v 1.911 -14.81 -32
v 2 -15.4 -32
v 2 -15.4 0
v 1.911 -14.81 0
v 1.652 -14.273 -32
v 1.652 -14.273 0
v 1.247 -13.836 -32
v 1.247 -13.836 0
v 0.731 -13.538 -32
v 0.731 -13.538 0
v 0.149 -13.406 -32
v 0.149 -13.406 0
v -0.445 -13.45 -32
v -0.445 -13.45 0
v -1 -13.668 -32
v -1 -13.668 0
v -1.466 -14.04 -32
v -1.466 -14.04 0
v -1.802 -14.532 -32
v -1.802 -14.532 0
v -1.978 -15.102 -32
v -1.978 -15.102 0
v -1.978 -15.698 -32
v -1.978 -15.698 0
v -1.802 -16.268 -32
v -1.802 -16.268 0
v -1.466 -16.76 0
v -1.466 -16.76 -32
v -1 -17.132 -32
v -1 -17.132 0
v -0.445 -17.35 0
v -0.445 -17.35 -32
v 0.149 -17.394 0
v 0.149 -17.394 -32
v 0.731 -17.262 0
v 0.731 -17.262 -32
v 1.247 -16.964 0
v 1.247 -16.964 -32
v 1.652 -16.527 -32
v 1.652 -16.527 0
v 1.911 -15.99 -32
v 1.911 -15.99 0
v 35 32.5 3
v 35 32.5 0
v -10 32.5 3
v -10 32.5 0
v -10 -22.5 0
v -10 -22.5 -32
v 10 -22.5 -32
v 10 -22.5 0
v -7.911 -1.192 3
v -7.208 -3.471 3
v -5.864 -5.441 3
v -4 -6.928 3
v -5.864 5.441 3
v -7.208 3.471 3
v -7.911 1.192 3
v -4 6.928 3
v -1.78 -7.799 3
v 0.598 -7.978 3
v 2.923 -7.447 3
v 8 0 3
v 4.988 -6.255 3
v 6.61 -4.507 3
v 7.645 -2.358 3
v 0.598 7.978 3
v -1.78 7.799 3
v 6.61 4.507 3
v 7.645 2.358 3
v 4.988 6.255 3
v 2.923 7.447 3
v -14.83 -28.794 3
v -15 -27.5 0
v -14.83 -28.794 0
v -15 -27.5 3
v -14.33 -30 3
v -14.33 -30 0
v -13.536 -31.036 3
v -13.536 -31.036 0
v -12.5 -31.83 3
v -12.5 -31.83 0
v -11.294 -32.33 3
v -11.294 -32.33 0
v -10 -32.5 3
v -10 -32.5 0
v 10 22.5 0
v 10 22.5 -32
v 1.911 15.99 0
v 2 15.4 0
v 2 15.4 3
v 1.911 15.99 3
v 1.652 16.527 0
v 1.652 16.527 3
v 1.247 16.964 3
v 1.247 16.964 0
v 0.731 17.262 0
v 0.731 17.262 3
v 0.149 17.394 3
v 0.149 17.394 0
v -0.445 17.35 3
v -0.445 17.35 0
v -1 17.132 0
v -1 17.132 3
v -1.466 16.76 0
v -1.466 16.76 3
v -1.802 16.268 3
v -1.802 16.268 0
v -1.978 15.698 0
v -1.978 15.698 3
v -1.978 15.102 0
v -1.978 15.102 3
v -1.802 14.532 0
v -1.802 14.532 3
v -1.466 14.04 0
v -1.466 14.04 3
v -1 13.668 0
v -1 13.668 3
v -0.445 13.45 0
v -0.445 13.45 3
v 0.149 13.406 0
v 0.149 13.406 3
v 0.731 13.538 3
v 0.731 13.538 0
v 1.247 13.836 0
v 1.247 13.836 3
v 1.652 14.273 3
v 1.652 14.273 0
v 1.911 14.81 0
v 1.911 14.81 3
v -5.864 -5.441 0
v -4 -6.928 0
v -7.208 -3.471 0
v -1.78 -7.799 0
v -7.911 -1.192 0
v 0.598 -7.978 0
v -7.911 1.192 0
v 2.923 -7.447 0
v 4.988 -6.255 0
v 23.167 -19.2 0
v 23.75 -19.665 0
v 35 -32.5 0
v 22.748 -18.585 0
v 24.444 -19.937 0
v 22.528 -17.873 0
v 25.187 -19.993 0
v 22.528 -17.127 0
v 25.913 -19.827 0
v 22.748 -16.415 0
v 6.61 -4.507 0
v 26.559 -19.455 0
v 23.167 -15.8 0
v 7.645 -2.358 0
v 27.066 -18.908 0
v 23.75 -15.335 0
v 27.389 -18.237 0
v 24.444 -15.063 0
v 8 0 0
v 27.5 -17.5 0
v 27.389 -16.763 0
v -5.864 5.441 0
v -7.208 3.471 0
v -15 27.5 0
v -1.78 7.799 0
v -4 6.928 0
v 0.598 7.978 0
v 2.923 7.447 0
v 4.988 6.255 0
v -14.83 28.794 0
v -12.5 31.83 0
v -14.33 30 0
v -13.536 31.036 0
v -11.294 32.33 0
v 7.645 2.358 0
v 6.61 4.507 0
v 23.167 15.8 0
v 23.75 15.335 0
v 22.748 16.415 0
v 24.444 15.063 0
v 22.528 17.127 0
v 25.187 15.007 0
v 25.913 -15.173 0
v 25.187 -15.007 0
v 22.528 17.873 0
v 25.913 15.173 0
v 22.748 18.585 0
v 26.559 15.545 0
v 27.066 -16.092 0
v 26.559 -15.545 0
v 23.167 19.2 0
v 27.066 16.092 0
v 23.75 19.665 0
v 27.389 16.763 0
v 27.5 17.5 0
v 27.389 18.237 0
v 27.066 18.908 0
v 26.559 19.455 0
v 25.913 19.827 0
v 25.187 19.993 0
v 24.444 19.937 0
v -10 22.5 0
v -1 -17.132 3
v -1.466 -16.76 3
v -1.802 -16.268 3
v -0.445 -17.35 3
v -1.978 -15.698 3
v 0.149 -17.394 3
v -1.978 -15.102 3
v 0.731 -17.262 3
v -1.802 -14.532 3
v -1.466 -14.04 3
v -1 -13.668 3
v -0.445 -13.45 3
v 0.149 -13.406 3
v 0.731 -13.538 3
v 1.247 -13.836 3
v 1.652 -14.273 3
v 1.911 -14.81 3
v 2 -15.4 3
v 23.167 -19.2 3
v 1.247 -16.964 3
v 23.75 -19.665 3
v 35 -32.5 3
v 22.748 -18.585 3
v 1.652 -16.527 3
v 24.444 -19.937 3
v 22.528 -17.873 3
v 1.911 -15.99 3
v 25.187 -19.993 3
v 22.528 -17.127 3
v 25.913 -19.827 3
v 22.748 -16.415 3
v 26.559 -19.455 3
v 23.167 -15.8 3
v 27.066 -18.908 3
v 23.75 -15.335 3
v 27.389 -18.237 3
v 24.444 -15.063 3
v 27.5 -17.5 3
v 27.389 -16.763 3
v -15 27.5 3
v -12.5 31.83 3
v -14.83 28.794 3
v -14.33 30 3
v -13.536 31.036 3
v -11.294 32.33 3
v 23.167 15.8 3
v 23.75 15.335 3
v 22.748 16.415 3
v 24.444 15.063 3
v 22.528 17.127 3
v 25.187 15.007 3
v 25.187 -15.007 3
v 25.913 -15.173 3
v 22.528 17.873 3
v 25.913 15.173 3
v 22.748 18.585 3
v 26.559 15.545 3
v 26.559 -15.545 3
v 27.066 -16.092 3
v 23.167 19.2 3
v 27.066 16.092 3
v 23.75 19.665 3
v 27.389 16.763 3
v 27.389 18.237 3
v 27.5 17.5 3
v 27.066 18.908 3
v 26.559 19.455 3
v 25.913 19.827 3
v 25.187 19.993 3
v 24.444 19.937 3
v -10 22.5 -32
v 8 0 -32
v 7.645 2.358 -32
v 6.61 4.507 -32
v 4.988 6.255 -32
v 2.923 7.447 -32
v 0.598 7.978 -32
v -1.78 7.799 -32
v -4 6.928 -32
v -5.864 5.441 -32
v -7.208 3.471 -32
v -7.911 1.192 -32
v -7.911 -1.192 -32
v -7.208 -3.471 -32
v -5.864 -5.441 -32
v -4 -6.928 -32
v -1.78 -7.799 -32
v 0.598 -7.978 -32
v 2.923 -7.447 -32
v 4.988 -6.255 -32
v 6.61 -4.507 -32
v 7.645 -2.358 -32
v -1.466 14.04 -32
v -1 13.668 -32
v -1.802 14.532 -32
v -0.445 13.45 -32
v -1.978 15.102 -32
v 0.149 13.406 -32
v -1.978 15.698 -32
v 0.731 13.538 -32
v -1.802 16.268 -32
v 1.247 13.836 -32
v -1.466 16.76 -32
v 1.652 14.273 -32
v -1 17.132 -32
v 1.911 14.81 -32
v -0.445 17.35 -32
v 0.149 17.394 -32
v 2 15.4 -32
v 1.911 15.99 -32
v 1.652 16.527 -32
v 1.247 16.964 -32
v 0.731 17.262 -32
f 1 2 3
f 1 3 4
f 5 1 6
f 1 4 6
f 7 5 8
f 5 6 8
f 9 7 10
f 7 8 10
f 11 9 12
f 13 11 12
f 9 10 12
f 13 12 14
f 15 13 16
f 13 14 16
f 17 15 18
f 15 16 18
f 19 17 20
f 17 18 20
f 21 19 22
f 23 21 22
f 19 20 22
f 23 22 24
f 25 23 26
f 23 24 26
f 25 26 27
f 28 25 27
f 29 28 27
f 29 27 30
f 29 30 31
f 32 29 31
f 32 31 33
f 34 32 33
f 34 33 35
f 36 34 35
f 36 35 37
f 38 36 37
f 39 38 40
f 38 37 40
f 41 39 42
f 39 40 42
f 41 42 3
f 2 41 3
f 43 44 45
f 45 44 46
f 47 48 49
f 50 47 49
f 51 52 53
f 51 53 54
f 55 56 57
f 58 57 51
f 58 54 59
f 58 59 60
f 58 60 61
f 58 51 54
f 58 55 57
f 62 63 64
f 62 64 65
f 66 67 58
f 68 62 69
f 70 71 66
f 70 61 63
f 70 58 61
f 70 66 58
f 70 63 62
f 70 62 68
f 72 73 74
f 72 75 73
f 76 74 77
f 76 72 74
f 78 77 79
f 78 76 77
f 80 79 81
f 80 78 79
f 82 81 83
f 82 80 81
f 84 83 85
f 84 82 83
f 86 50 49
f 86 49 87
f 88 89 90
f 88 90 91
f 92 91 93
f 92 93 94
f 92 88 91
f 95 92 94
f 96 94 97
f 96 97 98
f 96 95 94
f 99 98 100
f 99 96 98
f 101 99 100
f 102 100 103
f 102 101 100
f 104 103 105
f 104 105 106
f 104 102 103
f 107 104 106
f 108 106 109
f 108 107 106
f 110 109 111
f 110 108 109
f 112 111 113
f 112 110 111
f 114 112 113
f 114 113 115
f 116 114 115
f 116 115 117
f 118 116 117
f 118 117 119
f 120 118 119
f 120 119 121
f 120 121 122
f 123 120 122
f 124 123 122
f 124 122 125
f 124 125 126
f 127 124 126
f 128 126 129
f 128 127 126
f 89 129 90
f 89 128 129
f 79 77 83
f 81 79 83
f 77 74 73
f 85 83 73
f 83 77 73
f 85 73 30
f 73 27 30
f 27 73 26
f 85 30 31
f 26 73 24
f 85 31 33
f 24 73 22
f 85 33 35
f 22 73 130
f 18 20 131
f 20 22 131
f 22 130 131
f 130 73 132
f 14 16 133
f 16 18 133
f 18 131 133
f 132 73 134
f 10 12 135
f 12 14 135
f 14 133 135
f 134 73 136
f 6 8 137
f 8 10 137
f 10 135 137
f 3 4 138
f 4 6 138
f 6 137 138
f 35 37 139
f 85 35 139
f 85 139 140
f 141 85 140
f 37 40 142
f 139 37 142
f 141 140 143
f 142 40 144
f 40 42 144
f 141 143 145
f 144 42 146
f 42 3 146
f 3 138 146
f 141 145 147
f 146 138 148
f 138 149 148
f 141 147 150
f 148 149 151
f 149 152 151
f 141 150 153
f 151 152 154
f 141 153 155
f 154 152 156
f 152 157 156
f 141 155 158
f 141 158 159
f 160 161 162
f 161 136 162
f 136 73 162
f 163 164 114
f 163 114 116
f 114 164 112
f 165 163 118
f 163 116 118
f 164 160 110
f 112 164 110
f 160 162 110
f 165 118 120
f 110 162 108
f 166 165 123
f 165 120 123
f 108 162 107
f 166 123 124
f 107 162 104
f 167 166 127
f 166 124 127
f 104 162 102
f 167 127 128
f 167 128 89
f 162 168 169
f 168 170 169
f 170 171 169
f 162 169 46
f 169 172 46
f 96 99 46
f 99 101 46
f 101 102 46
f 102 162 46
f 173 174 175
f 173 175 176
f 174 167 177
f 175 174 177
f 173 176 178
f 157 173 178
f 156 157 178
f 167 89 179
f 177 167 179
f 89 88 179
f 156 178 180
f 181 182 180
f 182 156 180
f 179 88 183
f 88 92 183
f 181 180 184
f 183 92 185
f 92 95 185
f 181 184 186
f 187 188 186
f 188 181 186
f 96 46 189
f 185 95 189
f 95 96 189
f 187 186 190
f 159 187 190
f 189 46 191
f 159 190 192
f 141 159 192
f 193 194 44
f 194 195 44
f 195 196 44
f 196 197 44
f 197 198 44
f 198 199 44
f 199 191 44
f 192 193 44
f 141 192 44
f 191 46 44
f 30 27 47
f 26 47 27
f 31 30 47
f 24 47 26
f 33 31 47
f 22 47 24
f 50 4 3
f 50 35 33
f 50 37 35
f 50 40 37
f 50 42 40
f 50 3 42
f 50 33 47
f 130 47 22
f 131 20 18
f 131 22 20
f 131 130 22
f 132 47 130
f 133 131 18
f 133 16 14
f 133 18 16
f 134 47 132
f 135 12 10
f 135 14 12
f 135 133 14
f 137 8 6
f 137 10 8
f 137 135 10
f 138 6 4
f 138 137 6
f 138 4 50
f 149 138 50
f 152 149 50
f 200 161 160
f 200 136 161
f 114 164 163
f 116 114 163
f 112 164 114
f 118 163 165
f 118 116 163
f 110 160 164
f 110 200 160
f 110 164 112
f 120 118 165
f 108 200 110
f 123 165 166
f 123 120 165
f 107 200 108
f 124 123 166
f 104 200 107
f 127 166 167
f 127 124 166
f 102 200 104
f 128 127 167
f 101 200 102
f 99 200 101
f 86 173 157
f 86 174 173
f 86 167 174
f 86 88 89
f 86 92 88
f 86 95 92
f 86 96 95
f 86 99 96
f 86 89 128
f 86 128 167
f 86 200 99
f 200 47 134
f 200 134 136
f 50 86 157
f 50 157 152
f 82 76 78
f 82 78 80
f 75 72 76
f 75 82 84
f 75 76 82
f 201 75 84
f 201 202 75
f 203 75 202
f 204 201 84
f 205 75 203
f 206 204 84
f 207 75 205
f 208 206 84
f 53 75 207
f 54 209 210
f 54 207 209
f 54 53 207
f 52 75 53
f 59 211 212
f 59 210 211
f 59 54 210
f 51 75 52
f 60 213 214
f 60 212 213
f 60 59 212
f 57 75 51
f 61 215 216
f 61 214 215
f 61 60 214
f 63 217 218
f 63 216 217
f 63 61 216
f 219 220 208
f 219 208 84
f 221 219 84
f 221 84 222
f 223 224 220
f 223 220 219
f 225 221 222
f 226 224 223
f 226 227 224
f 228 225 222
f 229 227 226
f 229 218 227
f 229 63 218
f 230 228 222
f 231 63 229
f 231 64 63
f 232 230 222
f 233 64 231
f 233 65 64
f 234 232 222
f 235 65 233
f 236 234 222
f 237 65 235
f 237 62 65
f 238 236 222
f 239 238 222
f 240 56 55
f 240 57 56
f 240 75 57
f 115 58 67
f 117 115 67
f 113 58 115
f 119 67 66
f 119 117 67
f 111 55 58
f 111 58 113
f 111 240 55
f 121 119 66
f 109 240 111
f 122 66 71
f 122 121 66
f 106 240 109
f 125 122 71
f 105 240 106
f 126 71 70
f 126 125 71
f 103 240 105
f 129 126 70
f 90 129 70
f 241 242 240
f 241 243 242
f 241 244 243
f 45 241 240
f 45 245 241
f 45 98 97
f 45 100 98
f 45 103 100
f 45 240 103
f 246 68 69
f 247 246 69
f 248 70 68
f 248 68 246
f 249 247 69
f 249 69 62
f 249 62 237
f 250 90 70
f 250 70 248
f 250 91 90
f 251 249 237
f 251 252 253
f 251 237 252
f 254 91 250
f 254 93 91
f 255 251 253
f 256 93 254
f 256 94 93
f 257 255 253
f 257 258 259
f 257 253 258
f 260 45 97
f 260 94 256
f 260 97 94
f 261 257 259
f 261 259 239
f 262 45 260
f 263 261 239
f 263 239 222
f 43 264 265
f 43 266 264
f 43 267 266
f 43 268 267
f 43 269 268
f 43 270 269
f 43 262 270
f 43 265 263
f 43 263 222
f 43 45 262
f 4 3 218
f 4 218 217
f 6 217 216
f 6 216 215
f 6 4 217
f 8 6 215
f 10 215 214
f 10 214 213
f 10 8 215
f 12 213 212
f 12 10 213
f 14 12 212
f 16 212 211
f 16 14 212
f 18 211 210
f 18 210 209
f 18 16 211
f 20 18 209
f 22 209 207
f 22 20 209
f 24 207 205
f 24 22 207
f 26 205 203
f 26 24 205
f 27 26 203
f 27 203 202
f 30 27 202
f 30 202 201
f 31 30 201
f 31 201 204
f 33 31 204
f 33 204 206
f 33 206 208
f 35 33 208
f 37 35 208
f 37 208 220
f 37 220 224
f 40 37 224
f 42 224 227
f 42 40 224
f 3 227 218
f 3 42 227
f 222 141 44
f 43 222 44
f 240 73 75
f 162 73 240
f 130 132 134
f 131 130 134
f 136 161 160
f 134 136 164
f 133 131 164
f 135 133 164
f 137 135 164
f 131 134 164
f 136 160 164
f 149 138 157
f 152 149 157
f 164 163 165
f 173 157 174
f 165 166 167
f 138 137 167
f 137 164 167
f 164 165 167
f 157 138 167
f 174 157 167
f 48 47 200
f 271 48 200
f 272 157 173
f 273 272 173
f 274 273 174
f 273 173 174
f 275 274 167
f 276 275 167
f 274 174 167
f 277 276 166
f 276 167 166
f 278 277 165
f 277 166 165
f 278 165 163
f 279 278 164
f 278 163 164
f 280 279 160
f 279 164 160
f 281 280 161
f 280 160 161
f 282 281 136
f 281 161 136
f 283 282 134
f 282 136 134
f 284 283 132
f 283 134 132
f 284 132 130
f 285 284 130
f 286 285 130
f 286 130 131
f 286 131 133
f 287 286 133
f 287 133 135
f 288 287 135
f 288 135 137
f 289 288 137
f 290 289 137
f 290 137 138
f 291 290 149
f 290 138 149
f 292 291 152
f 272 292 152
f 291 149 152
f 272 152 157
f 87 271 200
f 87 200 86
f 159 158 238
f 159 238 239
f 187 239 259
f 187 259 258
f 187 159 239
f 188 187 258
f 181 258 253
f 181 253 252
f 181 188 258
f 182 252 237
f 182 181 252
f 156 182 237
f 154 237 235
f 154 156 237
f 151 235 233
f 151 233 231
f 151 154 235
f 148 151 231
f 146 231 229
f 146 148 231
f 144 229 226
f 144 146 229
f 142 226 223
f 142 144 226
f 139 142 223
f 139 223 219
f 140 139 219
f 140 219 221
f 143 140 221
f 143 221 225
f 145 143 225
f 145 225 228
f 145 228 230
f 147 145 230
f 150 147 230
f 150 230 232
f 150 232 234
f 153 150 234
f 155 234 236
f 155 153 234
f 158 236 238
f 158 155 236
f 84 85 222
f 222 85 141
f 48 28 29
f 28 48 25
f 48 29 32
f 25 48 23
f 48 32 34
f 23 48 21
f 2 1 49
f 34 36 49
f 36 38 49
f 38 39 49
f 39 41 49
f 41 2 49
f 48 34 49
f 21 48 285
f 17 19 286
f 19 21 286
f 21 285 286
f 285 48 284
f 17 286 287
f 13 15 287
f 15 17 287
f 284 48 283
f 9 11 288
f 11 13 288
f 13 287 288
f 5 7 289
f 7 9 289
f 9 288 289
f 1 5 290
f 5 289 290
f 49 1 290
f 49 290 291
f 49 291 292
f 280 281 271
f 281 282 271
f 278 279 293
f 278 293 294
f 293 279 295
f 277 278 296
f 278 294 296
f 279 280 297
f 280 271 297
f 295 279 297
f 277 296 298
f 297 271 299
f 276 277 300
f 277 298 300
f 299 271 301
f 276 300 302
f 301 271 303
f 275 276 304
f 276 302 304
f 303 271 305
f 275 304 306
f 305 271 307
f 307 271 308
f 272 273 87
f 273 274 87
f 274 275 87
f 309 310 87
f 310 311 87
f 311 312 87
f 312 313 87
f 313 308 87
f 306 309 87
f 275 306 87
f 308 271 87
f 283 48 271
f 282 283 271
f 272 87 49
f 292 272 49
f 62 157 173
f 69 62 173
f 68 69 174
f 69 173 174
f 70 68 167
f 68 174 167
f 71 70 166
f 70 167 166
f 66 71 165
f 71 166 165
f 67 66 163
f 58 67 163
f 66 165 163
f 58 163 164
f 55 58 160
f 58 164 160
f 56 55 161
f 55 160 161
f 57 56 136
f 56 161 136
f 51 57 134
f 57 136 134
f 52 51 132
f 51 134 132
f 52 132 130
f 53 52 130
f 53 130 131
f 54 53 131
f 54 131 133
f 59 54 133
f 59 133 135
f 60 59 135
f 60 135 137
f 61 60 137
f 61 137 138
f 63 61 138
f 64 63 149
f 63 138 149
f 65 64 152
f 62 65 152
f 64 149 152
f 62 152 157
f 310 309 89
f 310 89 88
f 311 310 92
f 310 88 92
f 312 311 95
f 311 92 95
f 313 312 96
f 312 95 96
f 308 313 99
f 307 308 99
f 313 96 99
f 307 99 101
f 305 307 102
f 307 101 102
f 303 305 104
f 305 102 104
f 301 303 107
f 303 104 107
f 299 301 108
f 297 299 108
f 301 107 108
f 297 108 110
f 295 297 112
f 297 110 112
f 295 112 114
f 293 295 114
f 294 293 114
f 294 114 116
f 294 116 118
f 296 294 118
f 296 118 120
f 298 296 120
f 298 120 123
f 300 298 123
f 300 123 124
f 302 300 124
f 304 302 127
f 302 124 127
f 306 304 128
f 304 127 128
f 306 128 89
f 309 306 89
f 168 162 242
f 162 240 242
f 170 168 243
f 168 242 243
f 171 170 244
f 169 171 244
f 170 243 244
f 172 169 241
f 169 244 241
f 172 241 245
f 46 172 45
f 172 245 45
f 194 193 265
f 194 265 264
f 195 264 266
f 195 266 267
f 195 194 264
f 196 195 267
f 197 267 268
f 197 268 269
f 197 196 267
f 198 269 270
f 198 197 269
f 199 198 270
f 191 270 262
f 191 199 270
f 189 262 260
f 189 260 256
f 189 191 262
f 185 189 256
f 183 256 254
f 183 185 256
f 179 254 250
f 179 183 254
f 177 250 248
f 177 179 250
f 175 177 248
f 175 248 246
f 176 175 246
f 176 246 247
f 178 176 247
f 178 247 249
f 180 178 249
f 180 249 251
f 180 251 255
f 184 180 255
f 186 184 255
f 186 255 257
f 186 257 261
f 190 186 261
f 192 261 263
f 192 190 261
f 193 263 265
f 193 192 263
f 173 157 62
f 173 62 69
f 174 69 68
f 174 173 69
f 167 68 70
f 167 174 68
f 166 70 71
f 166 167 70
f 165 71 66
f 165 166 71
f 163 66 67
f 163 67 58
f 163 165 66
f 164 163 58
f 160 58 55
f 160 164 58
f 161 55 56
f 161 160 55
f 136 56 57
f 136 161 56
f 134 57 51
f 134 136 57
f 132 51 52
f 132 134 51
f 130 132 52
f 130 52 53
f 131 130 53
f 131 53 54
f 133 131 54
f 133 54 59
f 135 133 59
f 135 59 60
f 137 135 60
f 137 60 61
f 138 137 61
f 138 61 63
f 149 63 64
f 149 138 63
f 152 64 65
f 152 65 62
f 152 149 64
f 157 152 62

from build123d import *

# Parameters (mm, degrees)
F0_W     = 20
F0_H     = 45
F0_R     = 2
F0_R_2   = 8
F1_DEPTH = 32
F2_DEPTH = 3
F3_W     = 30
F3_H     = 65
F3_W_2   = 20
F3_H_2   = 45
F3_R     = 2.5
F4_DEPTH = 3
F5_R     = 5


with BuildPart() as f1:
    # F0 (on Top) → F1 (new body)
    with BuildSketch(Plane.XY):
        Rectangle(F0_W, F0_H)
        with Locations((0, -15.4)):
            Circle(F0_R, mode=Mode.SUBTRACT)
        Circle(F0_R_2, mode=Mode.SUBTRACT)
        with Locations((0, 15.4)):
            Circle(F0_R, mode=Mode.SUBTRACT)
    extrude(amount=-F1_DEPTH)


with BuildPart() as f2:
    # F0 (on Top) → F2 (new body)
    with BuildSketch(Plane.XY):
        Circle(F0_R_2)
    extrude(amount=F2_DEPTH)


with BuildPart() as f4:
    # F3 (on face) + F0 (on Top) → F4 (new body)
    with BuildSketch(Plane.XY):
        Rectangle(F3_W, F3_H)
        Rectangle(F3_W_2, F3_H_2, mode=Mode.SUBTRACT)
        with Locations((25, 0)):
            Rectangle(F3_W_2, F3_H)
        with Locations((25, -17.5)):
            Circle(F3_R, mode=Mode.SUBTRACT)
        with Locations((25, 17.5)):
            Circle(F3_R, mode=Mode.SUBTRACT)
    with BuildSketch(Plane.XY):
        Rectangle(F0_W, F0_H)
        with Locations((0, -15.4)):
            Circle(F0_R, mode=Mode.SUBTRACT)
        Circle(F0_R_2, mode=Mode.SUBTRACT)
        with Locations((0, 15.4)):
            Circle(F0_R, mode=Mode.SUBTRACT)
    extrude(amount=F4_DEPTH)

    # F5
    f5_edges = [f4.edges().sort_by_distance(p)[0] for p in [
        (-15, 32.5, 1.5),
        (-15, -32.5, 1.5),
    ]]
    fillet(f5_edges, radius=F5_R)


solid = Compound([f1.part, f2.part, f4.part])
